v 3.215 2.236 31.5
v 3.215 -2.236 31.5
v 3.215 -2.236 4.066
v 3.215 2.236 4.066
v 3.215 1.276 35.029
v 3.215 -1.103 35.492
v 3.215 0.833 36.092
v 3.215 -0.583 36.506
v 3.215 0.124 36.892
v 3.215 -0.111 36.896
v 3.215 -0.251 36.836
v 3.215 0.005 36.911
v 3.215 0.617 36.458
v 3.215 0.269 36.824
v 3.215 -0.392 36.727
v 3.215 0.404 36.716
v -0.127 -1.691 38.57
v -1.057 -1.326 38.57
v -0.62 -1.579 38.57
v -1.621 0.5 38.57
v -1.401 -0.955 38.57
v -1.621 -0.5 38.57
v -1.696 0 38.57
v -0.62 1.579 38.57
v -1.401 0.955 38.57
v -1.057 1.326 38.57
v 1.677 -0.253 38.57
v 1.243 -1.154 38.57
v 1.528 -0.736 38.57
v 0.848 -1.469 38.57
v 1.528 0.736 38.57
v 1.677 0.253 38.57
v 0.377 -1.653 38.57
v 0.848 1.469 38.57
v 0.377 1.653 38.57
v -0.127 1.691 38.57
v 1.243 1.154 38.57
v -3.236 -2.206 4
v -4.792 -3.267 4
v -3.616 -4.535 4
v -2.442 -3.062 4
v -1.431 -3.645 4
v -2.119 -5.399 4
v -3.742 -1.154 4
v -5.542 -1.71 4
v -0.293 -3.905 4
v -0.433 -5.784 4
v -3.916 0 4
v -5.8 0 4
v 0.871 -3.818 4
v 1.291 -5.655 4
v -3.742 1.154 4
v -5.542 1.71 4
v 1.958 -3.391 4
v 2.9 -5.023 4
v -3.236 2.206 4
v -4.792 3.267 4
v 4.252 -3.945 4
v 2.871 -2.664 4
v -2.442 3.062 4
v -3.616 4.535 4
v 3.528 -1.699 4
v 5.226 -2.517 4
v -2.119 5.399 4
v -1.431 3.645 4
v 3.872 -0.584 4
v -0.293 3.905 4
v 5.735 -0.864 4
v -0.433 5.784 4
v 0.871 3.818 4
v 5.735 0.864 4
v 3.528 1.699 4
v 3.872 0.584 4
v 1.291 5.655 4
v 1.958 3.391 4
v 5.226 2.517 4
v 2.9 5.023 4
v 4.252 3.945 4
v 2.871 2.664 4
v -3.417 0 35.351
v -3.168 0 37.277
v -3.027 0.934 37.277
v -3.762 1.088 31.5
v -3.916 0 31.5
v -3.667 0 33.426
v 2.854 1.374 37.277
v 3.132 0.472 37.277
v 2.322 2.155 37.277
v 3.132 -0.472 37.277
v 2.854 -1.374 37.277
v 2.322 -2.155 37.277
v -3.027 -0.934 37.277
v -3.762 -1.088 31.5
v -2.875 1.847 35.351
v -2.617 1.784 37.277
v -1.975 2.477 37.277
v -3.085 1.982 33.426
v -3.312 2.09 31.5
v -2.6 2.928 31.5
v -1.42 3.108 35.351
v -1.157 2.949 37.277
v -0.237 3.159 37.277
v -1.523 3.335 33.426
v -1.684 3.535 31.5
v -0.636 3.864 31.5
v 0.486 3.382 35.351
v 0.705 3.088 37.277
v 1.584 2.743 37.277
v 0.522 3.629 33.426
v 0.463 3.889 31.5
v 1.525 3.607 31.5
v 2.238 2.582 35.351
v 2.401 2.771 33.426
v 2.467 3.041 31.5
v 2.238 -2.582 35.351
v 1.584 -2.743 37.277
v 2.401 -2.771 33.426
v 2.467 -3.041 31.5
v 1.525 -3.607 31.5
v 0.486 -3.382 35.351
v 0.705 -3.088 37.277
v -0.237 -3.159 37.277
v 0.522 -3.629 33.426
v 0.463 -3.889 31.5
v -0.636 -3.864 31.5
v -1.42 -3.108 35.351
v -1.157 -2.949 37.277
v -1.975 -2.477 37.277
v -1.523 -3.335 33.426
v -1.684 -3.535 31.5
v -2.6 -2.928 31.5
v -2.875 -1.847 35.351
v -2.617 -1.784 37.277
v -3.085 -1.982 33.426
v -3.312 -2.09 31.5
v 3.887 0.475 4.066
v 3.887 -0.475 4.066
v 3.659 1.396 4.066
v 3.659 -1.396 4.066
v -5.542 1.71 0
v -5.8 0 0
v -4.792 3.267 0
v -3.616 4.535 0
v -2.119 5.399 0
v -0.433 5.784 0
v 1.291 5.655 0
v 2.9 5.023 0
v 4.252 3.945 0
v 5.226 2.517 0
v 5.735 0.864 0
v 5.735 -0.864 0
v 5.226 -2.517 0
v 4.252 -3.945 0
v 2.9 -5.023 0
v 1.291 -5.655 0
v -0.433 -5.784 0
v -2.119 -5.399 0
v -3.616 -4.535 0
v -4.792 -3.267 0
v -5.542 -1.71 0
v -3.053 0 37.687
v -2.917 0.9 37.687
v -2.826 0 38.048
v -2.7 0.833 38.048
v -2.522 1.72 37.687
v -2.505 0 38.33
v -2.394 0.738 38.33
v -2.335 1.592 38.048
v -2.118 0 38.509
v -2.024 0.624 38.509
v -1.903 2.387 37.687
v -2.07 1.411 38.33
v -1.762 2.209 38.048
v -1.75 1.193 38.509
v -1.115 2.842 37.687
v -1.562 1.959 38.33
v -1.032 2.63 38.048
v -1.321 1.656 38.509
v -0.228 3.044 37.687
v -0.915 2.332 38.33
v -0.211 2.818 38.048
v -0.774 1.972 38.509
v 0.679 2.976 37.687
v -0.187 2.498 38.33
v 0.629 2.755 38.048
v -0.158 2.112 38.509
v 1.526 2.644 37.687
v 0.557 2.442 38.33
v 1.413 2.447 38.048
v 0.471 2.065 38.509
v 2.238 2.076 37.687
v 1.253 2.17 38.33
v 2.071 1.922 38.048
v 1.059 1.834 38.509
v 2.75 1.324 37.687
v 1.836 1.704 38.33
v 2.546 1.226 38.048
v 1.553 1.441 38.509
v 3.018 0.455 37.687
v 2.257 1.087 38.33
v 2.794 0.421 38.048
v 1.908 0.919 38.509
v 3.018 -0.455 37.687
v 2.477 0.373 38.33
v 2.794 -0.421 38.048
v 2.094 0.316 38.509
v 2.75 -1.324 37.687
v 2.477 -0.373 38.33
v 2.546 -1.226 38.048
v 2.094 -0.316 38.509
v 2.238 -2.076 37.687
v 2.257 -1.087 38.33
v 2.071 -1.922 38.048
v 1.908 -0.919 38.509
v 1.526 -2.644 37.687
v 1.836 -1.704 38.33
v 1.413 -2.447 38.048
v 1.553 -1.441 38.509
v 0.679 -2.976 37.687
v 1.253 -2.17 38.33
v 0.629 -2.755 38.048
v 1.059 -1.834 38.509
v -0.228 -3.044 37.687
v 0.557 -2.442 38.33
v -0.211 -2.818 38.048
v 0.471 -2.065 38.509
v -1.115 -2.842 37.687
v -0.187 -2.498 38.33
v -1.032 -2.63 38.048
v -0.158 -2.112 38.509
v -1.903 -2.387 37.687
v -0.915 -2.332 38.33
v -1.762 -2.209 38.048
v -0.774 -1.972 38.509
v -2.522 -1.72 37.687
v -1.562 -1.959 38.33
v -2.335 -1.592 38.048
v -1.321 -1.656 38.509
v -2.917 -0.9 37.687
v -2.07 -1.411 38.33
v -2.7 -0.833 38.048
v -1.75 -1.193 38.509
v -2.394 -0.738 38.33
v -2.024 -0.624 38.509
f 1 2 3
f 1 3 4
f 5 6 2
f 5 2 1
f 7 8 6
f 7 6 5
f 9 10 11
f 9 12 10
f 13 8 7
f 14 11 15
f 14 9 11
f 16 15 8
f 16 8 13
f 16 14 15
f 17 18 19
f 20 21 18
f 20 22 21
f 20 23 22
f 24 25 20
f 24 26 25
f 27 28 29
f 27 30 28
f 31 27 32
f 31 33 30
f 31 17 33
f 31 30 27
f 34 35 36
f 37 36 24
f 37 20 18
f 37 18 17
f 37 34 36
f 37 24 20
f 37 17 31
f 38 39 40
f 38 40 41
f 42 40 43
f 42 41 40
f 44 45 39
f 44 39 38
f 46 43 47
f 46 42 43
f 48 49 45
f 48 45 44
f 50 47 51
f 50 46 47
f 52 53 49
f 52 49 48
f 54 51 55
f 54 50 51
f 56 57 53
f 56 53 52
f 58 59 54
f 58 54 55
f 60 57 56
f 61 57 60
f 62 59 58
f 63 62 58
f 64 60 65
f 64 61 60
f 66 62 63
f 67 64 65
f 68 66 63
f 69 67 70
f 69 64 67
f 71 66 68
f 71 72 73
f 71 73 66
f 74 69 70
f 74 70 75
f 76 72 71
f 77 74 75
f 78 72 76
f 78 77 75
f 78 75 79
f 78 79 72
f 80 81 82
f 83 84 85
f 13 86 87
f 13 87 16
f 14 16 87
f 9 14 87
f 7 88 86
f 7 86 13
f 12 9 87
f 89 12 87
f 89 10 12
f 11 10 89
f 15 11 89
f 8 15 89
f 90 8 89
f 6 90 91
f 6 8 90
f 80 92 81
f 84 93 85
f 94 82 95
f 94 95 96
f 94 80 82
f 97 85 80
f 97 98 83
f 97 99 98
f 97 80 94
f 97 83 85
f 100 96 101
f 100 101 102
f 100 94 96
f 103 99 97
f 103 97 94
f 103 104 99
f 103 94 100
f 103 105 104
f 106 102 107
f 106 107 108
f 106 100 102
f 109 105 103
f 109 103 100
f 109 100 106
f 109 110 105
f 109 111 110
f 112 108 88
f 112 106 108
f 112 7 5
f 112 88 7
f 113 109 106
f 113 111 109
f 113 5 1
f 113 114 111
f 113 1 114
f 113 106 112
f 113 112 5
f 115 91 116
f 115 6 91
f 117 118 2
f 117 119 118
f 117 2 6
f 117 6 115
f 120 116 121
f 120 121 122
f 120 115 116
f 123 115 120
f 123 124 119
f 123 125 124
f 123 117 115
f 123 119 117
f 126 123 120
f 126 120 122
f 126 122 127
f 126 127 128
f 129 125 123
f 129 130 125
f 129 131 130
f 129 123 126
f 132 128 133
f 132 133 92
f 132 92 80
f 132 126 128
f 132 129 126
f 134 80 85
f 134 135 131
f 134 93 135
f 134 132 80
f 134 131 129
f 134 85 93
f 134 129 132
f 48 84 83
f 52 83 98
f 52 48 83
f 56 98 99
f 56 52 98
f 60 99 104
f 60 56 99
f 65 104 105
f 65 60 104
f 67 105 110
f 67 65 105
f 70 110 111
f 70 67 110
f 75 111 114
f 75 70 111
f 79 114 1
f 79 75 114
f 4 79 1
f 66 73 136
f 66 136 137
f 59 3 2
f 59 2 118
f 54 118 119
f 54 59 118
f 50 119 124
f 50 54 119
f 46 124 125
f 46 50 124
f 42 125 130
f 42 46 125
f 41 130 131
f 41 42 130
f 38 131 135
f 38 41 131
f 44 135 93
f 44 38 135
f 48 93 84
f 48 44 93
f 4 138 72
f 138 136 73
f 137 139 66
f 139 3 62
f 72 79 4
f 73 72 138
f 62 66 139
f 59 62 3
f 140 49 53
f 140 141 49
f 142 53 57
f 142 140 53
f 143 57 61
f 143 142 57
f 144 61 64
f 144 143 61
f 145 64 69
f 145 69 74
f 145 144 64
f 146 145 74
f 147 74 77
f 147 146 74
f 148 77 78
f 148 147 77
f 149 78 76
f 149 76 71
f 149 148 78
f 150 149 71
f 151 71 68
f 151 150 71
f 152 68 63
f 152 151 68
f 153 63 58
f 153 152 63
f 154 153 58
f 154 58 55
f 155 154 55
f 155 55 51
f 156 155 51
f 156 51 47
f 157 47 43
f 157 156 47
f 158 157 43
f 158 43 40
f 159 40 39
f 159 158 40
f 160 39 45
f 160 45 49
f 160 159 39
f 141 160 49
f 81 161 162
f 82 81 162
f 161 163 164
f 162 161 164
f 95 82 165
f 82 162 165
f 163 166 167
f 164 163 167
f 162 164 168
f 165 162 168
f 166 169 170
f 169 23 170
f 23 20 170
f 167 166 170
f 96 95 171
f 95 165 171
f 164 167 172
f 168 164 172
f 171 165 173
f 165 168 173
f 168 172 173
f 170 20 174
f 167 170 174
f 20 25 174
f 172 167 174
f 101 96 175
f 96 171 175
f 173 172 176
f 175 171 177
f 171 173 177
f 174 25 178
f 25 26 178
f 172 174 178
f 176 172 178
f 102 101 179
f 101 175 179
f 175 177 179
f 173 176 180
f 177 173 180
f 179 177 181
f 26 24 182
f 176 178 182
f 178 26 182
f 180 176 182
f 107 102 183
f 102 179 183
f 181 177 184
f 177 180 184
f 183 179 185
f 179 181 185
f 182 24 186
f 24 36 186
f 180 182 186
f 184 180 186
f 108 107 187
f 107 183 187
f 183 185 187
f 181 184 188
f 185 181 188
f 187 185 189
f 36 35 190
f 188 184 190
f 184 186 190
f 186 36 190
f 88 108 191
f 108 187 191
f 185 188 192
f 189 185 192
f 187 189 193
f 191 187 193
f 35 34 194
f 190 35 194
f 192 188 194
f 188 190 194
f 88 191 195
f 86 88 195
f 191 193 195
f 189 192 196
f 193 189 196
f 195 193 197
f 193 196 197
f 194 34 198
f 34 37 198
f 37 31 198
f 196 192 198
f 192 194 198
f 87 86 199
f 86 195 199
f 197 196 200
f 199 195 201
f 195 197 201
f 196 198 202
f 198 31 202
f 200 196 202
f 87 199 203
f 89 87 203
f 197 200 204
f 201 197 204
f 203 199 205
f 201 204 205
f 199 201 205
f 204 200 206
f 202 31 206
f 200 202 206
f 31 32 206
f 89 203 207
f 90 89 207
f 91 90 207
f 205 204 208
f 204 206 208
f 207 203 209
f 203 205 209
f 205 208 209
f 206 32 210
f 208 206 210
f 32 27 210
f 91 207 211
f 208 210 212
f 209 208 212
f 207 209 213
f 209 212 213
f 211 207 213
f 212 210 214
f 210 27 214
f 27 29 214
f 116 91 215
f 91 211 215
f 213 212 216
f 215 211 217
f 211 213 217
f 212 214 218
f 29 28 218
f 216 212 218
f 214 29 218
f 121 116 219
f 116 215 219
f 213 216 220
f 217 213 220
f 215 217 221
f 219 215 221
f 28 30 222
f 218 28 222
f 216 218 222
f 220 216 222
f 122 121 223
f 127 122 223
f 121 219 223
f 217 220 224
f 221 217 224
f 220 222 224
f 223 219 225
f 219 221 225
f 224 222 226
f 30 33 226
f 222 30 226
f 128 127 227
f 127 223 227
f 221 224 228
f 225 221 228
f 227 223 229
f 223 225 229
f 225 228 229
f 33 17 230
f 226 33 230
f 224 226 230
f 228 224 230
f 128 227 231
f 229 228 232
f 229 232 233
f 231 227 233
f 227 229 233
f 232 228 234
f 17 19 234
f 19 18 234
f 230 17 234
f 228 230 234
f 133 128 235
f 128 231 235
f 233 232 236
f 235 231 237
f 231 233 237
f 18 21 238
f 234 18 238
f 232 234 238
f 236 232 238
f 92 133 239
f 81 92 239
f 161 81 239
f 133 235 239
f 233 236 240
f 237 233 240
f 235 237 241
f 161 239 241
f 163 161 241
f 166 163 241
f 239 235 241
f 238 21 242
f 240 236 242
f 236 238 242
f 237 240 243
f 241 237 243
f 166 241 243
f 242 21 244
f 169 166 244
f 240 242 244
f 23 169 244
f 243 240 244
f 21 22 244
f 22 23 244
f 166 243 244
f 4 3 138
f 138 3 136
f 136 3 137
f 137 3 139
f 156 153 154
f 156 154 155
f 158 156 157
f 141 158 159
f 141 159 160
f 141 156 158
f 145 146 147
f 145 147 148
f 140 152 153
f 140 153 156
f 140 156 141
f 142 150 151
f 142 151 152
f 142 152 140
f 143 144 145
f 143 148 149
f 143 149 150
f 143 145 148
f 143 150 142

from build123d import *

# Parameters (mm, degrees)
F4_DEPTH = 9.6
F5_R     = 1.483987


with BuildPart() as f1:
    # F0 (on Front) → F1 (revolve)
    with BuildSketch(Plane.XZ):
        Polygon((-5.8, 0), (0, 0), (0, 38.57), (-3, 38.57), (-3.916144, 31.5), (-3.916144, 4), (-5.8, 4), align=None)
    revolve(axis=Axis((0, 0, 19.285), (0, 0, -1)))

    # F3 (on offset) → F4 (cut)
    with BuildSketch(Plane.YZ.offset(3.215)):
        Polygon((-4.207731, 39.193626), (-4.207731, 4.065906), (4.512294, 4.065906), (4.867772, 39.193626), align=None)
    extrude(amount=F4_DEPTH, mode=Mode.SUBTRACT)

    # F5
    f5_edges = [f1.edges().sort_by_distance(p)[0] for p in [
        (3, 0, 38.57),
    ]]
    fillet(f5_edges, radius=F5_R)


solid = f1.part
